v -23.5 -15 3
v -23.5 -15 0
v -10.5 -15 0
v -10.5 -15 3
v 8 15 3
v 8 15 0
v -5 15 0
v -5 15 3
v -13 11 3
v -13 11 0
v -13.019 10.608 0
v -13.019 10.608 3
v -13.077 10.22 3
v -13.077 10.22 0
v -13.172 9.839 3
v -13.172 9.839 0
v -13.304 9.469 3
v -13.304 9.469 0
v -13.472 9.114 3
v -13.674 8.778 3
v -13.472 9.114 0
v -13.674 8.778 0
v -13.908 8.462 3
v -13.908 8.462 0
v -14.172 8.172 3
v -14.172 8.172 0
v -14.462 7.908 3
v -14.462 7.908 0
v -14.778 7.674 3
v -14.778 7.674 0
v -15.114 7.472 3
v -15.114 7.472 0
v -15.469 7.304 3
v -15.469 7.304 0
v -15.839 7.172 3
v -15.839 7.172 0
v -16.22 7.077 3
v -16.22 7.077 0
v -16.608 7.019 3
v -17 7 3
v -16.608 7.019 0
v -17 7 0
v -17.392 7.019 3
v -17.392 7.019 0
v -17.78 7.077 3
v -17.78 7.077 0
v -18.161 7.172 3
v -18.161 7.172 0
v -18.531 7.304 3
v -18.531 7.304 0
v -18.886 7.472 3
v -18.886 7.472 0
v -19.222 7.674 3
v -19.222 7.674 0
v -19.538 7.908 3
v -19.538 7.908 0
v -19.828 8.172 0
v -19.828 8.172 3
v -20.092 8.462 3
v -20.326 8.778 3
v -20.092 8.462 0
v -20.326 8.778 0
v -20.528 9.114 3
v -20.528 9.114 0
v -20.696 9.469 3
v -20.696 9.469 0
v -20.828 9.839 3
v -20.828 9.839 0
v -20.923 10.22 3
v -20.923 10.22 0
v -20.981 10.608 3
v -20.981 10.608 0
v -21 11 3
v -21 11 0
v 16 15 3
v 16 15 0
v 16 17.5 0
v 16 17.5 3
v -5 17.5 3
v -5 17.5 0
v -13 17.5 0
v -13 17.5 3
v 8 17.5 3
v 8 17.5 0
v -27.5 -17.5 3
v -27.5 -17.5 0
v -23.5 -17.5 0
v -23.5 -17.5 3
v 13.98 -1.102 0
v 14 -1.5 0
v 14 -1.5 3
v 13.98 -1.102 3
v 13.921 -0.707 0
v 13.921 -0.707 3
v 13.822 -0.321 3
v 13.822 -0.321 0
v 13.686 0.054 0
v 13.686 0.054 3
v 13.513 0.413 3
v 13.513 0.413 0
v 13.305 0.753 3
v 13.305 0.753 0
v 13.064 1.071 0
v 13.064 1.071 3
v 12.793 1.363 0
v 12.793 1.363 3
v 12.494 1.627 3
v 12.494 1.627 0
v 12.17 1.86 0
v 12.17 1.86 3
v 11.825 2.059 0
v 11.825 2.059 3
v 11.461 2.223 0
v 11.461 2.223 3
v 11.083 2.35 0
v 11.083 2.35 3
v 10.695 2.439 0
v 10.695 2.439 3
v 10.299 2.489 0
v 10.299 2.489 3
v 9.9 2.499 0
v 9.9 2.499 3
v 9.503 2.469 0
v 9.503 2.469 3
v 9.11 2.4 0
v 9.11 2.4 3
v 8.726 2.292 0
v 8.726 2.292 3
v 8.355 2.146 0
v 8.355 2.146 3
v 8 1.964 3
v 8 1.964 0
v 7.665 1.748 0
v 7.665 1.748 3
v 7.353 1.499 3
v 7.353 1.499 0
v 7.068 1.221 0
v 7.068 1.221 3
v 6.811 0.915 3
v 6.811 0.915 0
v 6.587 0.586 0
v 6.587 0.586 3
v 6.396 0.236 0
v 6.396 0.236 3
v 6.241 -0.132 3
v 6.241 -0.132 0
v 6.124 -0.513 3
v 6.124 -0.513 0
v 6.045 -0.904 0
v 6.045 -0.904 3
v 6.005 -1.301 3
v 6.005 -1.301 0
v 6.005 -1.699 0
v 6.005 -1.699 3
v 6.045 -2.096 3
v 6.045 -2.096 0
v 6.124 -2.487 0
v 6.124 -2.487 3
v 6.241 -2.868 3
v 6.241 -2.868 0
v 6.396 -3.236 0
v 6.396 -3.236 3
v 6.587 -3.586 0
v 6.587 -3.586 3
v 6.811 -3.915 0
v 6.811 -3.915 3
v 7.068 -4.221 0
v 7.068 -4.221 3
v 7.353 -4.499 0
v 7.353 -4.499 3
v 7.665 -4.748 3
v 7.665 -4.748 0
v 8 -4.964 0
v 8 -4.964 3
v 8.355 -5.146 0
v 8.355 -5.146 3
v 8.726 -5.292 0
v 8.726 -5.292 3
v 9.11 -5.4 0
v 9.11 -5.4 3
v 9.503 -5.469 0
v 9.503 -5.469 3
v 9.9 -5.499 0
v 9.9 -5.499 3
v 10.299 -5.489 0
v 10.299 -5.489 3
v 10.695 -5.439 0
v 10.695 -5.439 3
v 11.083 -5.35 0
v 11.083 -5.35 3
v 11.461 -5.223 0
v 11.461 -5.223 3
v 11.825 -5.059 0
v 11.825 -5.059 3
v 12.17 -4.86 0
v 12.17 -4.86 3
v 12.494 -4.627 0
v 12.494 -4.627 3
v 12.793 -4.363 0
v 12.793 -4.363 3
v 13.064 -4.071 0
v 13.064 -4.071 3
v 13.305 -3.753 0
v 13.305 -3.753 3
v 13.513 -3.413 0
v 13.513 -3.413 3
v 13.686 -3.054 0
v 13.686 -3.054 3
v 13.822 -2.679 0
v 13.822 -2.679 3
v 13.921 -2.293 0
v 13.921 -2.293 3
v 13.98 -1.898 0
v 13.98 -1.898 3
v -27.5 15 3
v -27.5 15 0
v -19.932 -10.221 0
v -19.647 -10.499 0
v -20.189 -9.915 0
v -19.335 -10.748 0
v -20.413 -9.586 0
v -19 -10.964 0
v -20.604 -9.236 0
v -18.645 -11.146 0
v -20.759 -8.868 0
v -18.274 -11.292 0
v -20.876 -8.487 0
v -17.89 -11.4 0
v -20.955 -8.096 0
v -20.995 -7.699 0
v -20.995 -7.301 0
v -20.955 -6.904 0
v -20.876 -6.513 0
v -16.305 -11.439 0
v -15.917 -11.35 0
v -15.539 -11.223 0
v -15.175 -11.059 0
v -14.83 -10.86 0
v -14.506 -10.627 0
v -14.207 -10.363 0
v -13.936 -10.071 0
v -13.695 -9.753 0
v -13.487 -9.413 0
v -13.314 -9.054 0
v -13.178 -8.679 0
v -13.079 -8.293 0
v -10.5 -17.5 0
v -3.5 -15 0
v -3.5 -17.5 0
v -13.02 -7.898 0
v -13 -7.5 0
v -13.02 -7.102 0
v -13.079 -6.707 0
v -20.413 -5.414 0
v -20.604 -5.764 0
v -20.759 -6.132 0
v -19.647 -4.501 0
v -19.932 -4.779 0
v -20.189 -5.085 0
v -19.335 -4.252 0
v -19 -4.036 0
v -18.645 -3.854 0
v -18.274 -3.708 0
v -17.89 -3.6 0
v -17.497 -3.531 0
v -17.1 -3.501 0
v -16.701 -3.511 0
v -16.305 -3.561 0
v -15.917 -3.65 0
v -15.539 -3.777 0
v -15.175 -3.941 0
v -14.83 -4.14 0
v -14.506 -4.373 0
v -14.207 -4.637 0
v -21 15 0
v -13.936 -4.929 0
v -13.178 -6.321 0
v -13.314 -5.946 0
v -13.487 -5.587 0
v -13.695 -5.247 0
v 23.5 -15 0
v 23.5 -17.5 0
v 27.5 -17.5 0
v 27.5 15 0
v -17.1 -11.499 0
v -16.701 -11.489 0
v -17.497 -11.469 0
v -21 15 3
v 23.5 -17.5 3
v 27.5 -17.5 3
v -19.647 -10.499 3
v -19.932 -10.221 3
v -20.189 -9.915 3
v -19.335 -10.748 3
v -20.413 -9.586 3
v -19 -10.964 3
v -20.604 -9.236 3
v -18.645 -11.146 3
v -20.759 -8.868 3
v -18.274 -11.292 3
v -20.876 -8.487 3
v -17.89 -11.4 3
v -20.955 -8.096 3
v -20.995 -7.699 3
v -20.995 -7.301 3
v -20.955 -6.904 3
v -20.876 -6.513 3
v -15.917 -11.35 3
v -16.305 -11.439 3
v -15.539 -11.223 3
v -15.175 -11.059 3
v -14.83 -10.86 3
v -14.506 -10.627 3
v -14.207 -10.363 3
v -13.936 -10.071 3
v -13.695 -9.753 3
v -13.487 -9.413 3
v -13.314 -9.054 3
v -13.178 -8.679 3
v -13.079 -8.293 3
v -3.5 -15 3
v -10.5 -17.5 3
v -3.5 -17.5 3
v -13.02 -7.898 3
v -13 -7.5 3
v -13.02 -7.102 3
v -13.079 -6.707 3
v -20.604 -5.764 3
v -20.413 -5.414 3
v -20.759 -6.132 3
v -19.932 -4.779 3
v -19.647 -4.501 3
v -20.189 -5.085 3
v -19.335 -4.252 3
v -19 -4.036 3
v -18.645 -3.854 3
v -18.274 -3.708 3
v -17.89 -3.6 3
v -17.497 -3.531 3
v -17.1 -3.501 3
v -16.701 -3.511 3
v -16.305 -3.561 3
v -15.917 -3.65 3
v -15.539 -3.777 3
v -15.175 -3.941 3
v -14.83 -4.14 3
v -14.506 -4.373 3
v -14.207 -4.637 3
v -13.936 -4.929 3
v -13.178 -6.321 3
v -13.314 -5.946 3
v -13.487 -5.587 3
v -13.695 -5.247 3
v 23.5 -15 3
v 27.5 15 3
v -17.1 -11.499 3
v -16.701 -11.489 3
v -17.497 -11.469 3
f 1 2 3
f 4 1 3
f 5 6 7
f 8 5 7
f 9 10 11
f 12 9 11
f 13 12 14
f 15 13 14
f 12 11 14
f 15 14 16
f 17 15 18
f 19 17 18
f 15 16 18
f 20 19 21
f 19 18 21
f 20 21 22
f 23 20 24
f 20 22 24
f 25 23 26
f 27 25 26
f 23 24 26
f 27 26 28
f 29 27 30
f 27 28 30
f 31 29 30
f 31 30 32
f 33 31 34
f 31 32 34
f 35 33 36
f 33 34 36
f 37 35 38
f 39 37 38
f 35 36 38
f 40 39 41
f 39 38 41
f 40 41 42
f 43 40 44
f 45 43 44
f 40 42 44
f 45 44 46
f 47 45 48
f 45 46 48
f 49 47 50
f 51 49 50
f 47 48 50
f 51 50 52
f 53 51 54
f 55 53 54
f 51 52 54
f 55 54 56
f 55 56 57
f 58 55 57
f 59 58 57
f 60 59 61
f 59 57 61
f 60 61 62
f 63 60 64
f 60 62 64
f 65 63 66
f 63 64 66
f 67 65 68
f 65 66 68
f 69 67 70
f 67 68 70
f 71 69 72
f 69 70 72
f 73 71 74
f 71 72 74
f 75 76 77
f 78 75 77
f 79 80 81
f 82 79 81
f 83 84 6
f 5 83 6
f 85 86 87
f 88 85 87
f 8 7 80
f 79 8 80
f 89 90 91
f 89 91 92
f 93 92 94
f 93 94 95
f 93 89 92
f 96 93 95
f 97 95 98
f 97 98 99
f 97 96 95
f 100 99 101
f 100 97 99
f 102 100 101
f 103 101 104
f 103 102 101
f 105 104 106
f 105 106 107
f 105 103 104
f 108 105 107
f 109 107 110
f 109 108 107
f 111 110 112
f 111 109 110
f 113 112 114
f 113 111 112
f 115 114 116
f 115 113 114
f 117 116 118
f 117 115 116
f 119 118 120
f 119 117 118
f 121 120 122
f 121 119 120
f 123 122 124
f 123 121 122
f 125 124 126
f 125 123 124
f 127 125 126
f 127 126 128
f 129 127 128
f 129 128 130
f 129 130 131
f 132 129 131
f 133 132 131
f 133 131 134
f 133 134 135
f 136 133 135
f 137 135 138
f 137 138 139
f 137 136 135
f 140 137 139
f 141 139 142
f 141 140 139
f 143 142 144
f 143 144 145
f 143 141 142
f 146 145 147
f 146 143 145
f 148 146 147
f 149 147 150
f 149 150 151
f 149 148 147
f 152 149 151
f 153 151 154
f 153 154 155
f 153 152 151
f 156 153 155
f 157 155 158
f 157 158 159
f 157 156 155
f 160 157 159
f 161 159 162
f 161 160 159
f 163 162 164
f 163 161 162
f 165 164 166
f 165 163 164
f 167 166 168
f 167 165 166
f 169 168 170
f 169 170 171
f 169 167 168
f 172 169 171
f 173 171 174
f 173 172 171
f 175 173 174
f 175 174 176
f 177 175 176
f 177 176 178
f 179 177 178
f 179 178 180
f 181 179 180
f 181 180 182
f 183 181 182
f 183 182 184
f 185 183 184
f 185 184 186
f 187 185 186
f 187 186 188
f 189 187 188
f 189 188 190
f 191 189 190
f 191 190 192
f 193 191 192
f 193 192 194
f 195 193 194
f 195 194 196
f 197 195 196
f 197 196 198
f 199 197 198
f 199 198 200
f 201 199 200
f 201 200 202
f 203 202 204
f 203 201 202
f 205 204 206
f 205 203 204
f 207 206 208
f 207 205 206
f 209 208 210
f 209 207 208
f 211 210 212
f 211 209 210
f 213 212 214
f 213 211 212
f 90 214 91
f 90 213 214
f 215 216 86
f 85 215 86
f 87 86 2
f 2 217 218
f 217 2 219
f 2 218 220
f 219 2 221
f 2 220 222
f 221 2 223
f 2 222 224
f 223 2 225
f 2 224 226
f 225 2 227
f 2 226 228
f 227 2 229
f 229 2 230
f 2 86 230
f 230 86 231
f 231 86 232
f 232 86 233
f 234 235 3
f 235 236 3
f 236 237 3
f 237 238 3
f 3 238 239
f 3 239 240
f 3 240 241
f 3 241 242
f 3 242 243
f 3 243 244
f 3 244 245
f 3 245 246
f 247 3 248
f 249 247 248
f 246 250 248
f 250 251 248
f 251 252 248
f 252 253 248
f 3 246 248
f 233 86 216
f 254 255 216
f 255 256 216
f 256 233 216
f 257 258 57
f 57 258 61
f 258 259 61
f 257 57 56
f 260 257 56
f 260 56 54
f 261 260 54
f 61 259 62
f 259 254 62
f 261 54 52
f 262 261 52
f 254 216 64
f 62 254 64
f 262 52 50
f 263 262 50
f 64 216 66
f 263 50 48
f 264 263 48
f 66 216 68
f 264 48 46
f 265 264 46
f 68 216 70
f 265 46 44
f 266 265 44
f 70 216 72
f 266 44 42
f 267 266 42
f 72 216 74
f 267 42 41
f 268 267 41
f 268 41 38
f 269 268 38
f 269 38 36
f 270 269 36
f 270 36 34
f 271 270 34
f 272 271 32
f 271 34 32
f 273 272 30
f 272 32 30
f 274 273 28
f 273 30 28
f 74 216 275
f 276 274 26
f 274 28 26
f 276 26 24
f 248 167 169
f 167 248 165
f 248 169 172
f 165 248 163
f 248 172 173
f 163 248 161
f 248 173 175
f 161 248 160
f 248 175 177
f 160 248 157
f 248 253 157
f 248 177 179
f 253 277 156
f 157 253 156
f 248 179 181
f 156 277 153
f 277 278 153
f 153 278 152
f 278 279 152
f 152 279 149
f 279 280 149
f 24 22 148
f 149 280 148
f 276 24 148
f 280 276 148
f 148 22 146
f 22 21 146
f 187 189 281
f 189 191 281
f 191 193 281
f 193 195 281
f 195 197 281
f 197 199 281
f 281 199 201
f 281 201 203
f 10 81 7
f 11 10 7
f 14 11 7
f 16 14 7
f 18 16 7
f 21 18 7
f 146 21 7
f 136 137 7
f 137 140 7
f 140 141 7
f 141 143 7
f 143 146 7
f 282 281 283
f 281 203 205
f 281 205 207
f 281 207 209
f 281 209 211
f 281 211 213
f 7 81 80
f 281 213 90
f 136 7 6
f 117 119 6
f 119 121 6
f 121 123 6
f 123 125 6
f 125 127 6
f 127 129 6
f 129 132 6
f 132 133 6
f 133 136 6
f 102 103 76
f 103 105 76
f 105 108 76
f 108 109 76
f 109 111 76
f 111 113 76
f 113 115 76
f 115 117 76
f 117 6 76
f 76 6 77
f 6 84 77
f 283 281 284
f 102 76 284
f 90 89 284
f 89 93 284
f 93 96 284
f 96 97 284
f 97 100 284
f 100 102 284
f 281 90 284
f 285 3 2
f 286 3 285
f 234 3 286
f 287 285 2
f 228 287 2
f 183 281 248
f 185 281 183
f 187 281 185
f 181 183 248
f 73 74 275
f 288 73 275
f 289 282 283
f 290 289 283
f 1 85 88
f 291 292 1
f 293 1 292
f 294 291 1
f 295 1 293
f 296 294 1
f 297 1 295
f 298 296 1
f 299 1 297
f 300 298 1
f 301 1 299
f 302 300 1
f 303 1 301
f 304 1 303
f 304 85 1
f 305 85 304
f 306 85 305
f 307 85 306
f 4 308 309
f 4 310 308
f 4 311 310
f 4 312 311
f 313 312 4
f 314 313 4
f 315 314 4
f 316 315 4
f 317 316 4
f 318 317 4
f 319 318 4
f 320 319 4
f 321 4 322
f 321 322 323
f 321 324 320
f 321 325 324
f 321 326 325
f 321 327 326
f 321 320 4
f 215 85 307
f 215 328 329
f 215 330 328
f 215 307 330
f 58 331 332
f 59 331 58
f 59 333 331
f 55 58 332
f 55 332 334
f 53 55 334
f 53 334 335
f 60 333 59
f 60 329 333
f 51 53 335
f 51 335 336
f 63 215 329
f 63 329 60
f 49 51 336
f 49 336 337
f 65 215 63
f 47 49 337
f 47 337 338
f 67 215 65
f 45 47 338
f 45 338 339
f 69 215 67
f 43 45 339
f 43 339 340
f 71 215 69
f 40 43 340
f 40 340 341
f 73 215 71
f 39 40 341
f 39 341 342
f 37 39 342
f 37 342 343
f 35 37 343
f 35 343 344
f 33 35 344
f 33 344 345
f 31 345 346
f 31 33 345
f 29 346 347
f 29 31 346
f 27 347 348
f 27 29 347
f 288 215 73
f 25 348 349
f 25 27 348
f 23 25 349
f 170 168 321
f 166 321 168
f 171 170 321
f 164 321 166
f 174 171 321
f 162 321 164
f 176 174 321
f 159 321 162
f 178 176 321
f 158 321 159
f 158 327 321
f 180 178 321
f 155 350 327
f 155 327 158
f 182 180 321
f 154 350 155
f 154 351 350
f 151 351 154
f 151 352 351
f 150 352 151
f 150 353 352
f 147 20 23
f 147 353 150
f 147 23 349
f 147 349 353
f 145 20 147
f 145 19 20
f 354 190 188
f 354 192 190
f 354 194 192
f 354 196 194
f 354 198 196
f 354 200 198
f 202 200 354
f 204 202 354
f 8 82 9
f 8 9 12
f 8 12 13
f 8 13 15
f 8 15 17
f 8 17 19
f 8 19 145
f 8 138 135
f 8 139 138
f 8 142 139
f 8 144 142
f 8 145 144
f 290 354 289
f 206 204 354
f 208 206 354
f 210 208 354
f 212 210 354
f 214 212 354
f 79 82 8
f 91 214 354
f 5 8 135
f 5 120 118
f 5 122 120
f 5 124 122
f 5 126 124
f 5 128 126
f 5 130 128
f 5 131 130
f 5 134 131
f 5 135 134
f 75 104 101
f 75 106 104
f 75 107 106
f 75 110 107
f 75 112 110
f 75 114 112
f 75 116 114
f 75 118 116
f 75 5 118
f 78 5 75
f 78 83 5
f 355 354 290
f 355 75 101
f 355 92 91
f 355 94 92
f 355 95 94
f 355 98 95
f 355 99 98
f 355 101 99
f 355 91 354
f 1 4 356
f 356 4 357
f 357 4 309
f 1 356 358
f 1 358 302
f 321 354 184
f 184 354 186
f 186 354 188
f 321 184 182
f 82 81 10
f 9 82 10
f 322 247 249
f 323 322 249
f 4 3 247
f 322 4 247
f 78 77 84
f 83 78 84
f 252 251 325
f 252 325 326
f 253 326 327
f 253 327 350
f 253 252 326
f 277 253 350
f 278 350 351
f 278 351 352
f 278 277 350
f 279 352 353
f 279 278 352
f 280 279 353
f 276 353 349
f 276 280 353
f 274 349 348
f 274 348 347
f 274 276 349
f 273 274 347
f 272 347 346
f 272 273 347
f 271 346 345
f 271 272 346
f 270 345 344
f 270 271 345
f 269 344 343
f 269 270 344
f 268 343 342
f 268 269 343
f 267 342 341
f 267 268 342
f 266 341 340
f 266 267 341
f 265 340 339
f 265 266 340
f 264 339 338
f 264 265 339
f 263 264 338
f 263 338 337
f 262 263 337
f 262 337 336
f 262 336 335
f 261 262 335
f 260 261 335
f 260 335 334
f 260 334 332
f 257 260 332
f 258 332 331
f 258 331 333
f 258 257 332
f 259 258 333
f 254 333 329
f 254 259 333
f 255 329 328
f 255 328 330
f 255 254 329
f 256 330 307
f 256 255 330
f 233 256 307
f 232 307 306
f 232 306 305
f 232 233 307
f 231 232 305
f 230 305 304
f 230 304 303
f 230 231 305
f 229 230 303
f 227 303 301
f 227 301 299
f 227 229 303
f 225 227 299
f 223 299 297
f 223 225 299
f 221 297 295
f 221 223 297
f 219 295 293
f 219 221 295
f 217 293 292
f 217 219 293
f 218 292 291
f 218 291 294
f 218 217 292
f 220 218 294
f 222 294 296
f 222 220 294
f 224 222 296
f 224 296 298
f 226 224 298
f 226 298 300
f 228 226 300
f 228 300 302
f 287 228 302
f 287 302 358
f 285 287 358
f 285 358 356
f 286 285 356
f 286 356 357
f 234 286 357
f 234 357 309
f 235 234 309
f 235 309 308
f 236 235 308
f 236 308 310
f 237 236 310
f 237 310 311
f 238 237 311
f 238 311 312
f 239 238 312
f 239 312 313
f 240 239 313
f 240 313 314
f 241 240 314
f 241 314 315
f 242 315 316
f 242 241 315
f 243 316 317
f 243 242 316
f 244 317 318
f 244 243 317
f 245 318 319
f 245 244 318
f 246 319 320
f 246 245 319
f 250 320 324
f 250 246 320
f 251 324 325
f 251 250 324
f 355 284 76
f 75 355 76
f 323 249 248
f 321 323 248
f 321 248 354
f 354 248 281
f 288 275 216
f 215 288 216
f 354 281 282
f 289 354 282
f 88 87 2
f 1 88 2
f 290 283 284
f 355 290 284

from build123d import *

# Parameters (mm, degrees)
ESQUISSE1_R        = 4
BOSS_EXTRU_1_DEPTH = 3


with BuildPart() as part:
    # Esquisse1 → Boss.-Extru.1 (new body)
    with BuildSketch(Plane.XY):
        with BuildLine():
            Line((-21, 15), (-27.5, 15))
            Line((-27.5, 15), (-27.5, -17.5))
            Line((-27.5, -17.5), (-23.5, -17.5))
            Line((-23.5, -17.5), (-23.5, -15))
            Line((-23.5, -15), (-10.5, -15))
            Line((-10.5, -15), (-10.5, -17.5))
            Line((-10.5, -17.5), (-3.5, -17.5))
            Line((-3.5, -17.5), (-3.5, -15))
            Line((-3.5, -15), (23.5, -15))
            Line((23.5, -15), (23.5, -17.5))
            Line((23.5, -17.5), (27.5, -17.5))
            Line((27.5, -17.5), (27.5, 15))
            Line((27.5, 15), (16, 15))
            Line((16, 15), (16, 17.5))
            Line((16, 17.5), (8, 17.5))
            Line((8, 17.5), (8, 15))
            Line((8, 15), (-5, 15))
            Line((-5, 15), (-5, 17.5))
            Line((-5, 17.5), (-13, 17.5))
            Line((-13, 17.5), (-13, 11))
            ThreePointArc((-13, 11), (-17, 7), (-21, 11))
            Line((-21, 11), (-21, 15))
        make_face()
        with Locations((10, -1.5)):
            Circle(ESQUISSE1_R, mode=Mode.SUBTRACT)
        with Locations((-17, -7.5)):
            Circle(ESQUISSE1_R, mode=Mode.SUBTRACT)
    extrude(amount=BOSS_EXTRU_1_DEPTH)


solid = part.part
